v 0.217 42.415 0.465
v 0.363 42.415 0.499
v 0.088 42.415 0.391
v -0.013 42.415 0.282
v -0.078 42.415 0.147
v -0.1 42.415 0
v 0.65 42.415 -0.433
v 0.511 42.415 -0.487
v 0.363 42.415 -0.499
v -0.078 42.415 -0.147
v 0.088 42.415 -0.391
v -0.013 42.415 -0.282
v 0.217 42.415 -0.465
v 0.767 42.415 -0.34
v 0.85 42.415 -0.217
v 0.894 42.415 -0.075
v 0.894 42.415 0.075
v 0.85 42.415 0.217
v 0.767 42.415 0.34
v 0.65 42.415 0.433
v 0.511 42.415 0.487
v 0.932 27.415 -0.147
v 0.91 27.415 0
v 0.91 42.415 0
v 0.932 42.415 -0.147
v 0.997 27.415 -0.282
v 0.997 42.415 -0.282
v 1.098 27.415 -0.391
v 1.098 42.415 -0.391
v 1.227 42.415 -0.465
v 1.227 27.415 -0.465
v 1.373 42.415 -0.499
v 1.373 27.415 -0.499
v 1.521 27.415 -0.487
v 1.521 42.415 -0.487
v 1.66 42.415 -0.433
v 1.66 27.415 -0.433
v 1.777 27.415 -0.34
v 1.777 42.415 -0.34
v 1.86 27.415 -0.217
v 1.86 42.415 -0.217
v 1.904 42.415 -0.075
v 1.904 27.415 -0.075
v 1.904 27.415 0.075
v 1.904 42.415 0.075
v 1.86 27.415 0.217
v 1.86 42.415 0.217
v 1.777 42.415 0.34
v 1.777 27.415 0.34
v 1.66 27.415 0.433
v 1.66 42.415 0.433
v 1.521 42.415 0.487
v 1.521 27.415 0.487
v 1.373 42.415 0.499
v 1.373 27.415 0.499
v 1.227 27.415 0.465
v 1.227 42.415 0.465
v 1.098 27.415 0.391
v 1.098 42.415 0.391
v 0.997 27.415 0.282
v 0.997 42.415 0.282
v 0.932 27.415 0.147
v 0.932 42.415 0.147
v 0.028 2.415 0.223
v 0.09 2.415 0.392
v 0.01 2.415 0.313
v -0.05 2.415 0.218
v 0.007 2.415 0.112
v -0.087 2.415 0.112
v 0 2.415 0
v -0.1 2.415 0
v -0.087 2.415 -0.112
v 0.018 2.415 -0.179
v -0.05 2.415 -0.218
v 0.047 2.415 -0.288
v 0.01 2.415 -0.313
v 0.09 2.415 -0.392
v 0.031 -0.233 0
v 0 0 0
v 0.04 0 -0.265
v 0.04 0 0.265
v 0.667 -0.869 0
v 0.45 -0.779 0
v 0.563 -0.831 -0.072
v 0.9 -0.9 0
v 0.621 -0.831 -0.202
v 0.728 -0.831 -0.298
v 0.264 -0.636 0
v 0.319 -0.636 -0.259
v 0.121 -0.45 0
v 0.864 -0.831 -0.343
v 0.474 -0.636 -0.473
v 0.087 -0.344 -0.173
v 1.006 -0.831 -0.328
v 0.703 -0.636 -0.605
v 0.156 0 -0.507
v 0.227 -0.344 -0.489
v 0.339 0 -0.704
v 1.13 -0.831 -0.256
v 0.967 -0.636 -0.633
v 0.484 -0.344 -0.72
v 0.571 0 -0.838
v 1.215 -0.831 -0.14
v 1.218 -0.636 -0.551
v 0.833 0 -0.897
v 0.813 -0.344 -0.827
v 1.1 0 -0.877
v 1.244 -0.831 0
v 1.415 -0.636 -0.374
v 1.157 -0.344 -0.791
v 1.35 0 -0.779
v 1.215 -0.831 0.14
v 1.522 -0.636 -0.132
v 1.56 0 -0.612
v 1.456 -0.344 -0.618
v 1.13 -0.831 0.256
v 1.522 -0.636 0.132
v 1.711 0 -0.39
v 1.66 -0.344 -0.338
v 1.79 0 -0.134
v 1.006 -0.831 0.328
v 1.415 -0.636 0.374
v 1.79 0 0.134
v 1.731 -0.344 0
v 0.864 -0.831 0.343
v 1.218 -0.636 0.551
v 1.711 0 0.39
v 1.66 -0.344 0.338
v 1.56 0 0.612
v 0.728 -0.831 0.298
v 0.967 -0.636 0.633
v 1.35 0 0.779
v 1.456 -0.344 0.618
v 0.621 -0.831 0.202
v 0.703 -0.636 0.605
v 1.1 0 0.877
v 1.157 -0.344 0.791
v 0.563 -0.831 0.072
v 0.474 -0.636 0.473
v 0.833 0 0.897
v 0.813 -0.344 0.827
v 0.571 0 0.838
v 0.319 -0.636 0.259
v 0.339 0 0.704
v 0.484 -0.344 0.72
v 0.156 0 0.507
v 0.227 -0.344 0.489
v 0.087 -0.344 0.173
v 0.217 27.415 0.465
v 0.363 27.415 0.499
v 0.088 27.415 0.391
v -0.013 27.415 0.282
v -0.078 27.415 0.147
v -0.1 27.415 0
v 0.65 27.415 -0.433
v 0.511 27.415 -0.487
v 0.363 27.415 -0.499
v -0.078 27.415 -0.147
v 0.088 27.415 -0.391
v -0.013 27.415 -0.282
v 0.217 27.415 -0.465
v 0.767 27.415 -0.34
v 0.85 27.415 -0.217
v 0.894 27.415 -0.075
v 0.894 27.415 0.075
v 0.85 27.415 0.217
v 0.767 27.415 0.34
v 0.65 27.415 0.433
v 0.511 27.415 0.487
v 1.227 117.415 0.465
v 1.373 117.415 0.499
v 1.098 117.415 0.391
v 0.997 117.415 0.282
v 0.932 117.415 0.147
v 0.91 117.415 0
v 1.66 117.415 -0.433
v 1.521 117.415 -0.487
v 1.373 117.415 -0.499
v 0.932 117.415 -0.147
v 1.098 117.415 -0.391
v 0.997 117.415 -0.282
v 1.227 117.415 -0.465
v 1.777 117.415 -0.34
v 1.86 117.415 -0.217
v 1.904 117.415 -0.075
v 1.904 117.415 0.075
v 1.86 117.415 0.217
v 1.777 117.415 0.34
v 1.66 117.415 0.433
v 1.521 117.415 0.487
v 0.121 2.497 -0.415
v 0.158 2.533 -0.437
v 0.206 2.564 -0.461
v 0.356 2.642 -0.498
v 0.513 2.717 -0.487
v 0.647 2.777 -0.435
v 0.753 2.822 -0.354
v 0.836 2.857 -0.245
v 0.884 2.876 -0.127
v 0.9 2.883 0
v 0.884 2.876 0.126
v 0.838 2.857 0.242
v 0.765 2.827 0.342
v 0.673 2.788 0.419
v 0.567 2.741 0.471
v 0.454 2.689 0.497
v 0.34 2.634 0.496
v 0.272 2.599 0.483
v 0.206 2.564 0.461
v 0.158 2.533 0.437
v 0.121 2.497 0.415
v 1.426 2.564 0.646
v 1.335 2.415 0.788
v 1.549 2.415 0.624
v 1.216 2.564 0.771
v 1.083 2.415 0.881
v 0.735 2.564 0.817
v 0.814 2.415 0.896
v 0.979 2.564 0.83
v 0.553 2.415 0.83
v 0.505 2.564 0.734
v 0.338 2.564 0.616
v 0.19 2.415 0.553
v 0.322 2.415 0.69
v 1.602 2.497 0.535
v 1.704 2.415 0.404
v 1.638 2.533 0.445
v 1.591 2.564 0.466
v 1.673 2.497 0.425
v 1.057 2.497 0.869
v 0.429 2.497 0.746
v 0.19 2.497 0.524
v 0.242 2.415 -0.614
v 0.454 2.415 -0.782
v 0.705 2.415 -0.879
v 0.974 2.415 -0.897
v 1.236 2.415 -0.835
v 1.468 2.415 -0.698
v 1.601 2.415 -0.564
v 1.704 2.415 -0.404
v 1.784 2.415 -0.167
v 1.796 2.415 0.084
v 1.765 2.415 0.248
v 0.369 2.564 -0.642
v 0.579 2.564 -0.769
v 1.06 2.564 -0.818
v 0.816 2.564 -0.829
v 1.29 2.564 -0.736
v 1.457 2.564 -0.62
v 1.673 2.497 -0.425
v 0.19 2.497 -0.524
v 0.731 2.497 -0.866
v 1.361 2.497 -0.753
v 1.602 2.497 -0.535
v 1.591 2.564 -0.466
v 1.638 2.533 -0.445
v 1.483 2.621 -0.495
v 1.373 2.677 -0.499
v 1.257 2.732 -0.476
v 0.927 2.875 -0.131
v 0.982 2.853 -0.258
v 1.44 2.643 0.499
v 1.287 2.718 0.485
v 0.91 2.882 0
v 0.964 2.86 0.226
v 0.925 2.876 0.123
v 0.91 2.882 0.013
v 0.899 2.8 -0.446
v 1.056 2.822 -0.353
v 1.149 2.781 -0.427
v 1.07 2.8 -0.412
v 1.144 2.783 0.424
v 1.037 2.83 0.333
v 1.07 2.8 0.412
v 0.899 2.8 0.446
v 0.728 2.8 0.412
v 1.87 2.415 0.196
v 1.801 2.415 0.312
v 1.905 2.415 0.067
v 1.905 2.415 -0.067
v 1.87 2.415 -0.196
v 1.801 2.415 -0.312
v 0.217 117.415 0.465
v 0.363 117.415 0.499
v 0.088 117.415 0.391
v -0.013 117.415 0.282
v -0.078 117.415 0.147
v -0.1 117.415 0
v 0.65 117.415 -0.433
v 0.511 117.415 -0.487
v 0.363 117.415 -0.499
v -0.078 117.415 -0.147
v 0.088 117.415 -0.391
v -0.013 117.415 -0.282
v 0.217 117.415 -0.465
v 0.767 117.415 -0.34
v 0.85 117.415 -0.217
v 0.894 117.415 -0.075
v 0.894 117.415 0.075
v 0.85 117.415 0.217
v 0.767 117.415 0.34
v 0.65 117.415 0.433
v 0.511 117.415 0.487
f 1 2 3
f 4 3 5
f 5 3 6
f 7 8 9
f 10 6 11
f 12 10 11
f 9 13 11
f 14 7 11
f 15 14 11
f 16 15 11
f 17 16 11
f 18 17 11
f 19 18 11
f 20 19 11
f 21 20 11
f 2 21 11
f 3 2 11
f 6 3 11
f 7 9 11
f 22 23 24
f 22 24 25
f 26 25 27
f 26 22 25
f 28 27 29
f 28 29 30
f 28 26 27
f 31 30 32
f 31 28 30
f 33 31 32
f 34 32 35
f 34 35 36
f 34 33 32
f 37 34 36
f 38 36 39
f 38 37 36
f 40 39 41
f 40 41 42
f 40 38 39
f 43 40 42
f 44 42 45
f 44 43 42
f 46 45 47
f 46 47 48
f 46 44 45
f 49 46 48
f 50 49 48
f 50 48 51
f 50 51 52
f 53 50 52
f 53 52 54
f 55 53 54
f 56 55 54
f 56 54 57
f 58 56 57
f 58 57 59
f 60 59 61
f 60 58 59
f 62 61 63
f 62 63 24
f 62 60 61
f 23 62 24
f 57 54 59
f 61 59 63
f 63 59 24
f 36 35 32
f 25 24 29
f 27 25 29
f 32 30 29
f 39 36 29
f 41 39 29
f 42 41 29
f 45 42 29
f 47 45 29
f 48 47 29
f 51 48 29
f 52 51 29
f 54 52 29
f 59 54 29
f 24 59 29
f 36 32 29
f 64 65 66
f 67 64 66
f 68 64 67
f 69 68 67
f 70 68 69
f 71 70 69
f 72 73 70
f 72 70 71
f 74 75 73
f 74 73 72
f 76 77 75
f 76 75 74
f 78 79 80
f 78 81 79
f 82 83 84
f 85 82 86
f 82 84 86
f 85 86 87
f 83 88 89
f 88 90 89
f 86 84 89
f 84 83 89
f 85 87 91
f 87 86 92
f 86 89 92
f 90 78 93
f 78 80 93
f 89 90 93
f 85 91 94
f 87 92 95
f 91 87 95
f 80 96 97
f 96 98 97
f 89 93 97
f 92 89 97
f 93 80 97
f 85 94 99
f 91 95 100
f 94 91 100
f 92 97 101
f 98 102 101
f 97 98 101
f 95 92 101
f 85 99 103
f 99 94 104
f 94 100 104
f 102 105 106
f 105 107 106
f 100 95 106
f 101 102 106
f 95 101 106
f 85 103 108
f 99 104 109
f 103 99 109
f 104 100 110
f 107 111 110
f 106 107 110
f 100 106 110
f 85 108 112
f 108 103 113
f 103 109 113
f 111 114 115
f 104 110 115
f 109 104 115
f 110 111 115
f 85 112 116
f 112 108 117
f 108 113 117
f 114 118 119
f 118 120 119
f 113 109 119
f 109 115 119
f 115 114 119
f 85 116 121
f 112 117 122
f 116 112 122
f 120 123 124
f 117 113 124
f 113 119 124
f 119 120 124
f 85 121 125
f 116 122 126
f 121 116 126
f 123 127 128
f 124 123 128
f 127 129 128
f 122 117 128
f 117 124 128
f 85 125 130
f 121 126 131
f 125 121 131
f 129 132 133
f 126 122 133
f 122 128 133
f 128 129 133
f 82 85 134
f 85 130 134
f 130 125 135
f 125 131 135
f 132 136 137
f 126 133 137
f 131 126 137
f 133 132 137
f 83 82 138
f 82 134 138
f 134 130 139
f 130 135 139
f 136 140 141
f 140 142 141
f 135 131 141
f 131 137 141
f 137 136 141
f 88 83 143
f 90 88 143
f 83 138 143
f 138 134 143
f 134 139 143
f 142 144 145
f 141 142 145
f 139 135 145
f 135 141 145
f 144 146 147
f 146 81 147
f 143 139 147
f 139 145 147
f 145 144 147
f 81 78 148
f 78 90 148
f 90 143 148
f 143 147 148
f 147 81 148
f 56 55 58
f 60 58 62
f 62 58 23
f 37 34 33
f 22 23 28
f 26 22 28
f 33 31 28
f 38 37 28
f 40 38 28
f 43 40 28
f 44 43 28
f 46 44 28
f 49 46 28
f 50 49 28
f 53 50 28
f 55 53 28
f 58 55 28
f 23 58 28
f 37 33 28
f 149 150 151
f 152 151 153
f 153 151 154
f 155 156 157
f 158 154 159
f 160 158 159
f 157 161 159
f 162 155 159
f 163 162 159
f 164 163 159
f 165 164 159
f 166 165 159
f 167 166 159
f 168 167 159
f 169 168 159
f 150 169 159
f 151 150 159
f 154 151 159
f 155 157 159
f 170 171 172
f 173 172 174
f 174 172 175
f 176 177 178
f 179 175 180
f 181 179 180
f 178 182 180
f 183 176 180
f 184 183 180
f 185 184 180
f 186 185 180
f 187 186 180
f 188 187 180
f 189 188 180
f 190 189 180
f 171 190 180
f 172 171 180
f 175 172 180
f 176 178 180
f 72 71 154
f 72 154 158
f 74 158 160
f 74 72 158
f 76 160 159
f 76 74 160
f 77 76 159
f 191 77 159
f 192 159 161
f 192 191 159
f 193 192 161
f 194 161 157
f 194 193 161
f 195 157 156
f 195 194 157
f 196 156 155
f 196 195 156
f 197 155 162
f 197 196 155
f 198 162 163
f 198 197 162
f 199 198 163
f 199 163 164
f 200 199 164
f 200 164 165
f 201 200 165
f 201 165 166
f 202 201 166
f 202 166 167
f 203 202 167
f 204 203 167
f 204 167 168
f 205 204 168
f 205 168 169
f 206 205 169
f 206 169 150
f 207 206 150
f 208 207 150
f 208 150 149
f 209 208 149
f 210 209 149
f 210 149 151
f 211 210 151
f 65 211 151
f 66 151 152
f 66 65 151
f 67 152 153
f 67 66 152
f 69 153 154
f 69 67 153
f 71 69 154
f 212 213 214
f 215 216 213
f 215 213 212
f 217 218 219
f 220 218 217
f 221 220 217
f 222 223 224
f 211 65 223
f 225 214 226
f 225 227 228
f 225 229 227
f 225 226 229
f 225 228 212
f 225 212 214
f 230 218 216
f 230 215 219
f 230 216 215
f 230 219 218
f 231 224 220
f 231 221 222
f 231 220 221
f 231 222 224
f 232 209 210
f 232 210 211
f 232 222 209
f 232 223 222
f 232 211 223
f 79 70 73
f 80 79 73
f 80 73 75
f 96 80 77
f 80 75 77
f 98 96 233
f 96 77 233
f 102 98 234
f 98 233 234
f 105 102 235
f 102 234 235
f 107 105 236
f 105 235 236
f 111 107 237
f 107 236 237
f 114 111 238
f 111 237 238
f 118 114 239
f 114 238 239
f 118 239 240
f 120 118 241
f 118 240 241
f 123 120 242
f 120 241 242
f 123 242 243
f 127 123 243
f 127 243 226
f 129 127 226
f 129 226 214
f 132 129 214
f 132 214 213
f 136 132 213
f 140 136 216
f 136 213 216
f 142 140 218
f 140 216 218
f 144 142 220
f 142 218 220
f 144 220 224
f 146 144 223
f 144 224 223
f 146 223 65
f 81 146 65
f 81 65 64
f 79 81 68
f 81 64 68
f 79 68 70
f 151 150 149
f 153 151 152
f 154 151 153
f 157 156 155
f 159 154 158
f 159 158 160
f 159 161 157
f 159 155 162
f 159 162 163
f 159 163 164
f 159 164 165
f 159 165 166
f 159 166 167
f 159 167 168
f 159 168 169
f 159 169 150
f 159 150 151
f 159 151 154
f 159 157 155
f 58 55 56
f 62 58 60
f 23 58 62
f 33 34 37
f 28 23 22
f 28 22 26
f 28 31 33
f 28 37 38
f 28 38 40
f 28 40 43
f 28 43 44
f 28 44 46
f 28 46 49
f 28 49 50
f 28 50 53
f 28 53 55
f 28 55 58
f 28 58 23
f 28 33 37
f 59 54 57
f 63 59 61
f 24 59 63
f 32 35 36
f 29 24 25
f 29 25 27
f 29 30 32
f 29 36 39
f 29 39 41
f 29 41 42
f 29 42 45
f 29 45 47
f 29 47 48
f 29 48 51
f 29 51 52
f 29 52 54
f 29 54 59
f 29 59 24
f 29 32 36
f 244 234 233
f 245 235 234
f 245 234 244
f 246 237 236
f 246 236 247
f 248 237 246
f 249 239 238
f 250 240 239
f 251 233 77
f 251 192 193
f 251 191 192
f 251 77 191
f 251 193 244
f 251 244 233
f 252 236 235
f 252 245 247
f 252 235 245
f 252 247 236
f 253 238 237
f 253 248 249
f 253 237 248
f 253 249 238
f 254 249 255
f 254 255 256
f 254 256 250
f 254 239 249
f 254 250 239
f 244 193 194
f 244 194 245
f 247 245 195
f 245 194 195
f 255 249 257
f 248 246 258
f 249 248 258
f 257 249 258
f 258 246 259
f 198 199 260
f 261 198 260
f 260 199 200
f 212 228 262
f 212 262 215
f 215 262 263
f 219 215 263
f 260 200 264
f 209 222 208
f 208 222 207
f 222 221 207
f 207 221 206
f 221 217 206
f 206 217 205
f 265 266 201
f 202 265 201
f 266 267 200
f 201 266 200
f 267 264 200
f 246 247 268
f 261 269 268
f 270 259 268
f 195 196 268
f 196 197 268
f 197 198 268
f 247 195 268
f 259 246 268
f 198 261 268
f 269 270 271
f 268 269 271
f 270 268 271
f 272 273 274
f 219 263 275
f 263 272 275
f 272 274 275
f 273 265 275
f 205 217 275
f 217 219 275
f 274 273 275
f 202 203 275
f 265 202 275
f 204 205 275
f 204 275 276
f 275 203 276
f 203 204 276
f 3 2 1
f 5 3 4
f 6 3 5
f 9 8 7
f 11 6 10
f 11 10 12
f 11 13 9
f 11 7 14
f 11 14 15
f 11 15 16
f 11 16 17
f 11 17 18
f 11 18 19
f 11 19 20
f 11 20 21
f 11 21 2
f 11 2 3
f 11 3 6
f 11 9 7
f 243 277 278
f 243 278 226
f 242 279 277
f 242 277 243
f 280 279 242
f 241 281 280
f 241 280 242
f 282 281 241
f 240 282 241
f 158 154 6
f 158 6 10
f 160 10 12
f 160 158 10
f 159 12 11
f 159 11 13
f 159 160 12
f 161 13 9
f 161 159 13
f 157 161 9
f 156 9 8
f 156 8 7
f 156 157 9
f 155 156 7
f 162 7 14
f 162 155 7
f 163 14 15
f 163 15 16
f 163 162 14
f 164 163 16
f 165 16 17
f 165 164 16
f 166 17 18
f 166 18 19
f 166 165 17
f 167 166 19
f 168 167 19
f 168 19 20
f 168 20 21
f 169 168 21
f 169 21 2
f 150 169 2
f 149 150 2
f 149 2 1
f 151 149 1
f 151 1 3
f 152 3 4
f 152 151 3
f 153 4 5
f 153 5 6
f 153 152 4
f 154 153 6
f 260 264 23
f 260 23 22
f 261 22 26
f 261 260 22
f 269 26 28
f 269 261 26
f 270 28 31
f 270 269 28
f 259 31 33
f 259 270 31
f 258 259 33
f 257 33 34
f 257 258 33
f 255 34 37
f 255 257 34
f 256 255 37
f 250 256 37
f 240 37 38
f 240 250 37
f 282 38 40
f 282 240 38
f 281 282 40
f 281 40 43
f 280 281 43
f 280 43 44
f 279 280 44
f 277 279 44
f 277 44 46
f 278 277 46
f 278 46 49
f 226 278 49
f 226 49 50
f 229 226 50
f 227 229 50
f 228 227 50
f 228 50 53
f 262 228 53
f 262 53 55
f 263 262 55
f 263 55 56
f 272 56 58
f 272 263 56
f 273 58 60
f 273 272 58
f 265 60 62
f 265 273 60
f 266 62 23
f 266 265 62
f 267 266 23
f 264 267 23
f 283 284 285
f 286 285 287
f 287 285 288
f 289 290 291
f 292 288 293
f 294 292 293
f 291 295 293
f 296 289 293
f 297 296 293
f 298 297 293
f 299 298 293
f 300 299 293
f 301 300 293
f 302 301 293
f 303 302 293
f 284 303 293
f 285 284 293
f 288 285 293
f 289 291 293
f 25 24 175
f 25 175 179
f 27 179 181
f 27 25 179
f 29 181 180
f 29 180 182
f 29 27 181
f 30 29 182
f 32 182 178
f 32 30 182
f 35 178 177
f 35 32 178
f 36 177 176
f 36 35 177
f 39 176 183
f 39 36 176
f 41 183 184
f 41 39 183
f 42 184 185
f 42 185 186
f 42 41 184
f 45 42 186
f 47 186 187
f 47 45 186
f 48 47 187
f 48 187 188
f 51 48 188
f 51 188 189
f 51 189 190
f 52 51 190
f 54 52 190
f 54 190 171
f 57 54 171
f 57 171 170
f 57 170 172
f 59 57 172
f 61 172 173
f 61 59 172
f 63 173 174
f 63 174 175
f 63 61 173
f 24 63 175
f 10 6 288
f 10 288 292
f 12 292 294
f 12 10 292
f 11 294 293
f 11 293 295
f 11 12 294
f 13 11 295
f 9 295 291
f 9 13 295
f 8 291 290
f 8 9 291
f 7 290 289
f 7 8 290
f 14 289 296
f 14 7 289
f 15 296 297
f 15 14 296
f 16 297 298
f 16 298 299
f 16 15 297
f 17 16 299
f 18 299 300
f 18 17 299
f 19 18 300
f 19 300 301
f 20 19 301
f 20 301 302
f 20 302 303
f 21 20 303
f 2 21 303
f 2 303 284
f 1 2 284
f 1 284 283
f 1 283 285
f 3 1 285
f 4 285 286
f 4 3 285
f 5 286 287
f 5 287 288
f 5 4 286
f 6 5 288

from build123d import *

# Parameters (mm, degrees)
REDONDEO1_R               = 0.2
CROQUIS2_R                = 0.5
SALIENTE_EXTRUIR1_DEPTH   = 25
SALIENTE_EXTRUIR6_START   = -25
CROQUIS2_3_R              = 0.5
SALIENTE_EXTRUIR6_DEPTH   = 15
SALIENTE_EXTRUIR6_2_DEPTH = 15
SALIENTE_EXTRUIR7_START   = -40
CROQUIS2_4_R              = 0.5
SALIENTE_EXTRUIR7_DEPTH   = 75
SALIENTE_EXTRUIR7_2_DEPTH = 75


with BuildPart() as part:
    # Croquis1 → Revoluci_n2 (revolve)
    with BuildSketch(Plane.XY):
        with BuildLine():
            Line((0, 0), (0, 2.5))
            ThreePointArc((0, 2.5), (0.411039098, 2.782931151), (0.9, 2.882532421))
            Line((0.9, 2.882532421), (0.9, -0.9))
            ThreePointArc((0.9, -0.9), (0.263603897, -0.636396103), (0, 0))
        make_face()
    revolve(axis=Axis((0.9, 2.882532421, 0), (0, -1, 0)))

    # Redondeo1
    redondeo1_edges = [part.edges().sort_by_distance(p)[0] for p in [
        (1.8, 2.5, 0),
    ]]
    fillet(redondeo1_edges, radius=REDONDEO1_R)

    # Croquis2 → Saliente-Extruir1 (add)
    with BuildSketch(Plane(origin=(0, 2.415156213, 0), x_dir=(-1, 0, 0), z_dir=(0, -1, 0))):
        with Locations((-1.41, 0)):
            Circle(CROQUIS2_R)
        with Locations((-0.4, 0)):
            Circle(CROQUIS2_R)
    extrude(amount=-SALIENTE_EXTRUIR1_DEPTH)


with BuildPart() as body_2:
    # Croquis2_3 → Saliente-Extruir6 (new body)
    with BuildSketch(Plane(origin=(0, 2.415156213, 0), x_dir=(-1, 0, 0), z_dir=(0, -1, 0)).offset(SALIENTE_EXTRUIR6_START)):
        with Locations((-1.41, 0)):
            Circle(CROQUIS2_3_R)
    extrude(amount=-SALIENTE_EXTRUIR6_DEPTH)


with BuildPart() as body_3:
    # Croquis2_3 → Saliente-Extruir6 2 (new body)
    with BuildSketch(Plane(origin=(0, 2.415156213, 0), x_dir=(-1, 0, 0), z_dir=(0, -1, 0)).offset(SALIENTE_EXTRUIR6_START)):
        with Locations((-0.4, 0)):
            Circle(CROQUIS2_3_R)
    extrude(amount=-SALIENTE_EXTRUIR6_2_DEPTH)


with BuildPart() as body_4:
    # Croquis2_4 → Saliente-Extruir7 (new body)
    with BuildSketch(Plane(origin=(0, 2.415156213, 0), x_dir=(-1, 0, 0), z_dir=(0, -1, 0)).offset(SALIENTE_EXTRUIR7_START)):
        with Locations((-1.41, 0)):
            Circle(CROQUIS2_4_R)
    extrude(amount=-SALIENTE_EXTRUIR7_DEPTH)


with BuildPart() as body_5:
    # Croquis2_4 → Saliente-Extruir7 2 (new body)
    with BuildSketch(Plane(origin=(0, 2.415156213, 0), x_dir=(-1, 0, 0), z_dir=(0, -1, 0)).offset(SALIENTE_EXTRUIR7_START)):
        with Locations((-0.4, 0)):
            Circle(CROQUIS2_4_R)
    extrude(amount=-SALIENTE_EXTRUIR7_2_DEPTH)


solid = Compound([part.part, body_2.part, body_3.part, body_4.part, body_5.part])
